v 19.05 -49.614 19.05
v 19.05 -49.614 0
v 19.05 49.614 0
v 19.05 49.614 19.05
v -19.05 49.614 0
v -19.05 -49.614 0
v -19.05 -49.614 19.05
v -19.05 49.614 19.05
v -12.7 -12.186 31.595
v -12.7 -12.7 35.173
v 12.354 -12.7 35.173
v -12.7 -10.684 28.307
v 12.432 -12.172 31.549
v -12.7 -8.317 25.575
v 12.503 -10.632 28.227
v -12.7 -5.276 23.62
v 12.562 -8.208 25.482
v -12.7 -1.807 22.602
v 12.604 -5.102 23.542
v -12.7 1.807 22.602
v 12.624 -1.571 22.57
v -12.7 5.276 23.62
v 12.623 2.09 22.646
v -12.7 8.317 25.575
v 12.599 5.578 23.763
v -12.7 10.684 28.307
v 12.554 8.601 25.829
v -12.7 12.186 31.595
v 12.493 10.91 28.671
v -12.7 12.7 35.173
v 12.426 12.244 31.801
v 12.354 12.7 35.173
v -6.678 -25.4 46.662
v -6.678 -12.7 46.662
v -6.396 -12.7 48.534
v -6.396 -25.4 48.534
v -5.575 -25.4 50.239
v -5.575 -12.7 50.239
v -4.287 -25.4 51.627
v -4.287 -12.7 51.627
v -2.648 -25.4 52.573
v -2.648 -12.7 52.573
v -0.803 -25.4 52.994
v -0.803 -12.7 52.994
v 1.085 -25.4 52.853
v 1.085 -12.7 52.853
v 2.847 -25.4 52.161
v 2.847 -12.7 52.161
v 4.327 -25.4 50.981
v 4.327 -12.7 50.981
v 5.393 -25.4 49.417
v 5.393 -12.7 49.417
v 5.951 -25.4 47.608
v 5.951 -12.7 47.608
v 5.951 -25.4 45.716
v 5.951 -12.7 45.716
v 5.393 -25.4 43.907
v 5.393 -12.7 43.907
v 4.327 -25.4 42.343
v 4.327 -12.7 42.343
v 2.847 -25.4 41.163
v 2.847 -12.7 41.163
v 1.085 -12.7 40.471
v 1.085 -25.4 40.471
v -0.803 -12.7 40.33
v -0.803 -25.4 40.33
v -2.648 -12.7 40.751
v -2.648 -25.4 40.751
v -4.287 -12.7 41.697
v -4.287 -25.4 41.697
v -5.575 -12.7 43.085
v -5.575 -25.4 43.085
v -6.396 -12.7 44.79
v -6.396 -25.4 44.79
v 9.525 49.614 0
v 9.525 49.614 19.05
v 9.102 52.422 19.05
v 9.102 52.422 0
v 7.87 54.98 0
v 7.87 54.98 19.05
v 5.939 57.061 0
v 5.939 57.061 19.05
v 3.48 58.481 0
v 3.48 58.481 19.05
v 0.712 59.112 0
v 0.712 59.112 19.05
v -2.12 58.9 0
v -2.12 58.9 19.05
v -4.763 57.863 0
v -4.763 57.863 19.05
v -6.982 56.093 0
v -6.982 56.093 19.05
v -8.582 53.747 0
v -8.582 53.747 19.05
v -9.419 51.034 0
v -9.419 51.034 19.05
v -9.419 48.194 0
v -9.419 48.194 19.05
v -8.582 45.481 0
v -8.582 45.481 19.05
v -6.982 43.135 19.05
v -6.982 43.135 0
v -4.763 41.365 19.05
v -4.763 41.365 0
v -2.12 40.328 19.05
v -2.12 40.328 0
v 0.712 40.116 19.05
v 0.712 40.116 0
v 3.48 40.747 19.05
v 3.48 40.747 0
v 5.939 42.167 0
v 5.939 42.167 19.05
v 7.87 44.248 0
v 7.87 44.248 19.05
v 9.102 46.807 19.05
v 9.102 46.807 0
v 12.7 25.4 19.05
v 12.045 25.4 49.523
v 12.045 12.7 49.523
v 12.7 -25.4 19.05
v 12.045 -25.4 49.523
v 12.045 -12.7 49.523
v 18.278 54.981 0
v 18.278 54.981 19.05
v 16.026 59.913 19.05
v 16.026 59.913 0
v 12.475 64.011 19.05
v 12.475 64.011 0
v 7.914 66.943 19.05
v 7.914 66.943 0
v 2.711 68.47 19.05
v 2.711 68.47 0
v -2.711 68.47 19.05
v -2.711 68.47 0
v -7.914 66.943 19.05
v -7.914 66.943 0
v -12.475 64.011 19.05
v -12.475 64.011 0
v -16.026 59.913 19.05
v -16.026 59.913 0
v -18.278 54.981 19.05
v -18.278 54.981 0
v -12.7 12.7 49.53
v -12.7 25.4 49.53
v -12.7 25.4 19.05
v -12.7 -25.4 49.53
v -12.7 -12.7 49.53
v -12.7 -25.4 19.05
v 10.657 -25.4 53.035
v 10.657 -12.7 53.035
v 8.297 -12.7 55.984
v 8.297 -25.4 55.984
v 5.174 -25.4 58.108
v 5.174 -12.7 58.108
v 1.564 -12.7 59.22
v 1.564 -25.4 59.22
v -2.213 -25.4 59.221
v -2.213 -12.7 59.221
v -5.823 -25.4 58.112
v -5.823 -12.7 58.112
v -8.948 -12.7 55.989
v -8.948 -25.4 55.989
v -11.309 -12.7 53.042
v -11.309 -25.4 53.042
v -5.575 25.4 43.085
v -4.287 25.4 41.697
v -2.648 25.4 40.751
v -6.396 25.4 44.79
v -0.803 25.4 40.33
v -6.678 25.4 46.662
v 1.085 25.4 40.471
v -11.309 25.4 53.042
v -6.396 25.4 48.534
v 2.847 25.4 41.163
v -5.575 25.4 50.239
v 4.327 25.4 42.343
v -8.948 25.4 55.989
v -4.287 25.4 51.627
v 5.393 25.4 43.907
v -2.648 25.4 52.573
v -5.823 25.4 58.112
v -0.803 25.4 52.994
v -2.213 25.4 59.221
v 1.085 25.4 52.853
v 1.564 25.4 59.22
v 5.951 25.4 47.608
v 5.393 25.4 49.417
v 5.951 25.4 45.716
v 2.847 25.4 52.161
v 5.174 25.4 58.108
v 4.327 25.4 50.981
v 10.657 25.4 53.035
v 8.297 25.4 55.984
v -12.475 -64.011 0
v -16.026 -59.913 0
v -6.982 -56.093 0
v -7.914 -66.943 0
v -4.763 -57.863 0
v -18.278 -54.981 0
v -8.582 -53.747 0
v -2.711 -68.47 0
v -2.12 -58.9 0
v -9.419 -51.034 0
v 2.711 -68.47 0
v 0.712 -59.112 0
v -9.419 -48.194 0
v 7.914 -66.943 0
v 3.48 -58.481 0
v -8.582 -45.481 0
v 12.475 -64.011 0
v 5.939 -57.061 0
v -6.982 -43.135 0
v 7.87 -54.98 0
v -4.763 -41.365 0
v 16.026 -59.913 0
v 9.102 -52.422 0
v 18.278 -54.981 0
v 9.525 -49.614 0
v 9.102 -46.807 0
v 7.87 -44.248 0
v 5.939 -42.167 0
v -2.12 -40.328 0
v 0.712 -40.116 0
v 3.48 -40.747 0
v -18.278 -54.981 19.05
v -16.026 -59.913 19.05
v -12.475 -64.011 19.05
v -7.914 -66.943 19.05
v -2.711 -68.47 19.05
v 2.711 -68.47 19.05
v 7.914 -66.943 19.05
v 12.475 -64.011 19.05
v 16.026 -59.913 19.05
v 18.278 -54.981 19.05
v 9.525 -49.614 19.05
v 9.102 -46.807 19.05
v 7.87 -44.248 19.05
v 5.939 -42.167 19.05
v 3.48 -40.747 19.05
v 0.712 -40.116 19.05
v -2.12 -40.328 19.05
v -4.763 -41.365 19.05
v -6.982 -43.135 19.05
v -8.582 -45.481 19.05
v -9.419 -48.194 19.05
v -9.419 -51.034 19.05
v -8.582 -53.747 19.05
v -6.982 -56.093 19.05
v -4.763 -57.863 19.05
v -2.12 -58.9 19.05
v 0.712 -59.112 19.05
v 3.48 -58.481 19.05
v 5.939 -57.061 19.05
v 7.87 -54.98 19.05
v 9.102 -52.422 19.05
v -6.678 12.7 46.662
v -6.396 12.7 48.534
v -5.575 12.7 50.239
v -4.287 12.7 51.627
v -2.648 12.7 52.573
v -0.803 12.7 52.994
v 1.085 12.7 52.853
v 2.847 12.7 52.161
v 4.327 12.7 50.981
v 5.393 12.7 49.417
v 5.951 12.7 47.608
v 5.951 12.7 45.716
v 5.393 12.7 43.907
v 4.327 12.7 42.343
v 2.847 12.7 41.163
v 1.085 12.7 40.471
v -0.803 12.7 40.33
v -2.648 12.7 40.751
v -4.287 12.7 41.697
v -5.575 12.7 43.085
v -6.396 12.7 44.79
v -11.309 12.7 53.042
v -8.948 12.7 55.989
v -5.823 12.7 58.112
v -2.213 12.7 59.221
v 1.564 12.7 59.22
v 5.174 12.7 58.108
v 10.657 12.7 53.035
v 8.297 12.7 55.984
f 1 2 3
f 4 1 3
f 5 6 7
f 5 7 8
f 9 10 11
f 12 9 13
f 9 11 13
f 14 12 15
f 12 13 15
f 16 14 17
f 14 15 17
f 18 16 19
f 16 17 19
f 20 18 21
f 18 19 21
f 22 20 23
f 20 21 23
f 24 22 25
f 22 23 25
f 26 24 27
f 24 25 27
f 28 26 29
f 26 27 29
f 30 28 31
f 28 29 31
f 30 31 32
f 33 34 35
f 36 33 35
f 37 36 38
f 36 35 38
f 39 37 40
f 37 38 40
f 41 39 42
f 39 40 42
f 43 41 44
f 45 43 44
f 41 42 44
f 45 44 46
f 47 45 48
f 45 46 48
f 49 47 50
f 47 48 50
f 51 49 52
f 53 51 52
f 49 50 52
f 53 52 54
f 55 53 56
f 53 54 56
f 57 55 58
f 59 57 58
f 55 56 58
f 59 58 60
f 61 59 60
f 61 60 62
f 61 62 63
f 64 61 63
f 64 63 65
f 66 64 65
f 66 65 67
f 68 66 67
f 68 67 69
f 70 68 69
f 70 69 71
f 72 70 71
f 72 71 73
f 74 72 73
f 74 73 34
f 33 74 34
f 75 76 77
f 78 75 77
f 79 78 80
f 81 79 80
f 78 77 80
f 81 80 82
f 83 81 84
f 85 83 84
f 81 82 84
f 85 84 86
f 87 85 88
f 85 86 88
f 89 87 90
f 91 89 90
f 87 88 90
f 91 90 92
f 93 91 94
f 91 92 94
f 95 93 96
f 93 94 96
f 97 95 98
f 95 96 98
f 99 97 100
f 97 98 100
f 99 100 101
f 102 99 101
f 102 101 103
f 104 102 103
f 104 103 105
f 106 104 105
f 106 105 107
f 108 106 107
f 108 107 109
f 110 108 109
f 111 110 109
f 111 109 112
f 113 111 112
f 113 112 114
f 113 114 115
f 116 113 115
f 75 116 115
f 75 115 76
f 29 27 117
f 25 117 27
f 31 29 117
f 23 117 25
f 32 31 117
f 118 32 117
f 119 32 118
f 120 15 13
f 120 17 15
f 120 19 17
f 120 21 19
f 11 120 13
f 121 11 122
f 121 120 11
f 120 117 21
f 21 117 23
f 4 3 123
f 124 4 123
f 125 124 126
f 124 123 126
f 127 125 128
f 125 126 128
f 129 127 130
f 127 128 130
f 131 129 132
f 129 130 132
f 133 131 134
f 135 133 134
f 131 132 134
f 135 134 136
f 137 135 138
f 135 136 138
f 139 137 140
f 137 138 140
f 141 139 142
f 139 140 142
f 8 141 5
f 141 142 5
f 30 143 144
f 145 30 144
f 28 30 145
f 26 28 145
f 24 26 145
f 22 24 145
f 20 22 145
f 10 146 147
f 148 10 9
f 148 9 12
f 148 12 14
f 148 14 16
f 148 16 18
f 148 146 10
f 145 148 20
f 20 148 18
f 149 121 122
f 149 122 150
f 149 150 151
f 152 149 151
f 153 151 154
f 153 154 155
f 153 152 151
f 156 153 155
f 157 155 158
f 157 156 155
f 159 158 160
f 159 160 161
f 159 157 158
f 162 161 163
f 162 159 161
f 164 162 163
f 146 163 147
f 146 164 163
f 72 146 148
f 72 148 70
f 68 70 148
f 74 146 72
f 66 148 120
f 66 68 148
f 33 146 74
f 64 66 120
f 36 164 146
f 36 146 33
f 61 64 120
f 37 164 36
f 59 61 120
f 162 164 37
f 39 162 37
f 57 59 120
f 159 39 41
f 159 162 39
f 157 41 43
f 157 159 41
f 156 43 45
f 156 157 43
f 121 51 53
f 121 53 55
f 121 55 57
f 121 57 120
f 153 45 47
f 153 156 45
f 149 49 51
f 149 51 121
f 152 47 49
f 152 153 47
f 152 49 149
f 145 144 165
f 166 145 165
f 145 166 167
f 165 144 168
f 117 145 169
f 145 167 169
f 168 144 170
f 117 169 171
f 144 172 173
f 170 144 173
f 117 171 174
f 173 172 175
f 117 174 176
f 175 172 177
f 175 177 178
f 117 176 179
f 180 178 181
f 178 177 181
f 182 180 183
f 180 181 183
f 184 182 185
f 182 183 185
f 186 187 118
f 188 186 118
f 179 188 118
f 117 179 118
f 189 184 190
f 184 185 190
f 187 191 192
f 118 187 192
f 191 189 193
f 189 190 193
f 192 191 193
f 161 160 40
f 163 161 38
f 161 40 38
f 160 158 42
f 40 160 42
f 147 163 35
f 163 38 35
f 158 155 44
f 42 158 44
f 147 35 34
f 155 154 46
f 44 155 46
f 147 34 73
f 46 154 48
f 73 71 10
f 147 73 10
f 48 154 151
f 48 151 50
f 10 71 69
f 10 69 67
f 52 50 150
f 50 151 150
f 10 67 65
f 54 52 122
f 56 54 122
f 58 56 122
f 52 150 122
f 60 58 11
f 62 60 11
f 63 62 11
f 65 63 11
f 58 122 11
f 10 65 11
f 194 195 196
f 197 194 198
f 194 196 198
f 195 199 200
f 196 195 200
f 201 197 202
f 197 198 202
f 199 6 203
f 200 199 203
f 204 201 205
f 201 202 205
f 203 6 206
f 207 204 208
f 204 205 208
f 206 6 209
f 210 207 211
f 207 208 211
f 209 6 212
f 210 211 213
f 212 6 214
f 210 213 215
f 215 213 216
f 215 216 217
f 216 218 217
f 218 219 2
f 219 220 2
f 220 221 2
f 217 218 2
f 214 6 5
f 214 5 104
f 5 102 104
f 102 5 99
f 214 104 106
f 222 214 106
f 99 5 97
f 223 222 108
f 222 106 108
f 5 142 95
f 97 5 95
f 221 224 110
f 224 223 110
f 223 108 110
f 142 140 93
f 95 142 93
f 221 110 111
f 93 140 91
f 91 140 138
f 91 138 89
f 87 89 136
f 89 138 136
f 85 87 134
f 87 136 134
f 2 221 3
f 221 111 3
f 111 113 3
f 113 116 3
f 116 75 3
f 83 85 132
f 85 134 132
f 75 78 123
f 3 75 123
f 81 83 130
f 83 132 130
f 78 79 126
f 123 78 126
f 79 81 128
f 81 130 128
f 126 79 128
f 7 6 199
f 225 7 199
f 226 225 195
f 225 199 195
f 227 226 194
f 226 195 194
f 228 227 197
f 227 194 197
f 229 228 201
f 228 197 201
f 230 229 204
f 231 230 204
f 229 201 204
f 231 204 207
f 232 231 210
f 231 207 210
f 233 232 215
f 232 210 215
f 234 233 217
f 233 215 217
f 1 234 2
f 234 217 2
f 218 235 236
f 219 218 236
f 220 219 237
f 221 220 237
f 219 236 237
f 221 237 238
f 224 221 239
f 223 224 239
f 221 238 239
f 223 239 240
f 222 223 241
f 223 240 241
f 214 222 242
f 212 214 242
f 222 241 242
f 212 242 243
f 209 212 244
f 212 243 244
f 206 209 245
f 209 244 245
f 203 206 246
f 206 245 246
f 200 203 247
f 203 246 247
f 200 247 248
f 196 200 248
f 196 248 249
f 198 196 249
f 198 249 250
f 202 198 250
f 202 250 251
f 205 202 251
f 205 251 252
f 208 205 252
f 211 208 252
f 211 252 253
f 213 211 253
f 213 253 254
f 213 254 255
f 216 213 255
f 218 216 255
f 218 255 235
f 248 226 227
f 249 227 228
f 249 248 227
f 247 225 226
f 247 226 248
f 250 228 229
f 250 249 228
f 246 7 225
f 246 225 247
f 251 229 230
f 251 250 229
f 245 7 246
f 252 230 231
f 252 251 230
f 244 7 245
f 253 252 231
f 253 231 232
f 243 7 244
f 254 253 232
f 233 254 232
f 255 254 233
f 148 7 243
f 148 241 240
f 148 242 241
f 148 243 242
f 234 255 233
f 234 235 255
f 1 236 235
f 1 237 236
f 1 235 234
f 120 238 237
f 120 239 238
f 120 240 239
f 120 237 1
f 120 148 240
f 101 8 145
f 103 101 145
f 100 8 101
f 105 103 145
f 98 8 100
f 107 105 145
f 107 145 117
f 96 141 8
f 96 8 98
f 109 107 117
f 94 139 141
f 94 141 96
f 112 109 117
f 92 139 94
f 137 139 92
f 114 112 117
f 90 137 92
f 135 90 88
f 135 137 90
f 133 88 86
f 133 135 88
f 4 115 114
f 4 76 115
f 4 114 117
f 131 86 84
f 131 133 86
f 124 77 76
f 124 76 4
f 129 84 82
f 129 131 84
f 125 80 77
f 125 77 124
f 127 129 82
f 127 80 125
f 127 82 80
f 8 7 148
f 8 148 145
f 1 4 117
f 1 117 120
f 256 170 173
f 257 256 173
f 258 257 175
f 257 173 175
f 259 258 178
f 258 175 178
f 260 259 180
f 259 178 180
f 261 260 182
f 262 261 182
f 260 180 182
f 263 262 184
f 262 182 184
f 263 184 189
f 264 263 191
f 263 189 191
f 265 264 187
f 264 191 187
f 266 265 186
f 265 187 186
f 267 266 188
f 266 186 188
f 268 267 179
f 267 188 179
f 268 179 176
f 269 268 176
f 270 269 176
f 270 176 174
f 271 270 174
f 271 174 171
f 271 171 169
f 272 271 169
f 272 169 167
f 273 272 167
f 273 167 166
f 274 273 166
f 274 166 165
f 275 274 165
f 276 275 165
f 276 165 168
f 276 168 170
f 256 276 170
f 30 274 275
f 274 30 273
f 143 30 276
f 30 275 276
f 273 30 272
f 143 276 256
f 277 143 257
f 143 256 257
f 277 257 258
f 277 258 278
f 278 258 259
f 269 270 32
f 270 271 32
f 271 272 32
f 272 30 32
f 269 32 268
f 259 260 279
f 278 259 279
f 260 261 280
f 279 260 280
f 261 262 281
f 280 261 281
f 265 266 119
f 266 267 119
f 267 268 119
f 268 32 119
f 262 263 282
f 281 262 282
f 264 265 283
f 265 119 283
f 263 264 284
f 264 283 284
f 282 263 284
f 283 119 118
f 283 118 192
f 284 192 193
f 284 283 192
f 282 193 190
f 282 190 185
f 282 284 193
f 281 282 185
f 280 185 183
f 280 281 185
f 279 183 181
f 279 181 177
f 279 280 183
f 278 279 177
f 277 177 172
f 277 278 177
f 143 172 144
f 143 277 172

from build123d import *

# Parameters (mm, degrees)
F0_W      = 38.1
F0_H      = 99.228098
F1_DEPTH  = 19.05
F2_R      = 9.525
F3_DEPTH  = 127
F5_DEPTH  = 25.4
F6_R      = 6.35
F7_DEPTH  = 127
F9_DEPTH  = 63.5
F10_DEPTH = 127


with BuildPart() as f1:
    # F0 (on Top) → F1 (new body)
    with BuildSketch(Plane.XY):
        Rectangle(F0_W, F0_H)
        with BuildLine():
            Line((-19.05, 49.614049), (19.05, 49.614049))
            ThreePointArc((19.05, 49.614049), (0, 68.664049), (-19.05, 49.614049))
        make_face()
        with BuildLine():
            ThreePointArc((-19.05, -49.614049), (0, -68.664049), (19.05, -49.614049))
            Line((19.05, -49.614049), (-19.05, -49.614049))
        make_face()
    extrude(amount=F1_DEPTH)

    # F2 (on face) → F3 (cut)
    with BuildSketch(Plane.XY.offset(19.05)):
        with Locations((0, 49.614049)):
            Circle(F2_R)
        with Locations((0, -49.614049)):
            Circle(F2_R)
    extrude(amount=-F3_DEPTH, mode=Mode.SUBTRACT)

    # F4 (on Front) → F5 (join, symmetric)
    with BuildSketch(Plane.XZ):
        with BuildLine():
            Line((-12.7, 19.05), (0, 19.05))
            Line((0, 19.05), (12.7, 19.05))
            Line((12.7, 19.05), (12.045477, 49.522972))
            ThreePointArc((12.045477, 49.522972), (-0.324468, 59.36199), (-12.7, 49.53))
            Line((-12.7, 49.53), (-12.7, 19.05))
        make_face()
    extrude(amount=F5_DEPTH, both=True)

    # F6 (on face) → F7 (cut)
    with BuildSketch(Plane(origin=(0, 25.4, 0), x_dir=(-1, 0, 0), z_dir=(0, 1, 0))):
        with Locations((0.328075, 46.661991)):
            Circle(F6_R)
    extrude(amount=-F7_DEPTH, mode=Mode.SUBTRACT)

    # F8 (on Right) → F9 (cut, symmetric)
    with BuildSketch(Plane.YZ):
        with BuildLine():
            Line((12.7, 35.172723), (12.7, 75.489088))
            Line((12.7, 75.489088), (-12.7, 75.489088))
            Line((-12.7, 75.489088), (-12.7, 35.172723))
            ThreePointArc((-12.7, 35.172723), (0, 22.472723), (12.7, 35.172723))
        make_face()
    extrude(amount=F9_DEPTH, both=True, mode=Mode.SUBTRACT)

    # F8 (on Right) → F10 (cut, symmetric)
    with BuildSketch(Plane.YZ):
        with BuildLine():
            Line((12.7, 35.172723), (12.7, 75.489088))
            Line((12.7, 75.489088), (-12.7, 75.489088))
            Line((-12.7, 75.489088), (-12.7, 35.172723))
            ThreePointArc((-12.7, 35.172723), (0, 22.472723), (12.7, 35.172723))
        make_face()
    extrude(amount=F10_DEPTH, both=True, mode=Mode.SUBTRACT)


solid = f1.part
